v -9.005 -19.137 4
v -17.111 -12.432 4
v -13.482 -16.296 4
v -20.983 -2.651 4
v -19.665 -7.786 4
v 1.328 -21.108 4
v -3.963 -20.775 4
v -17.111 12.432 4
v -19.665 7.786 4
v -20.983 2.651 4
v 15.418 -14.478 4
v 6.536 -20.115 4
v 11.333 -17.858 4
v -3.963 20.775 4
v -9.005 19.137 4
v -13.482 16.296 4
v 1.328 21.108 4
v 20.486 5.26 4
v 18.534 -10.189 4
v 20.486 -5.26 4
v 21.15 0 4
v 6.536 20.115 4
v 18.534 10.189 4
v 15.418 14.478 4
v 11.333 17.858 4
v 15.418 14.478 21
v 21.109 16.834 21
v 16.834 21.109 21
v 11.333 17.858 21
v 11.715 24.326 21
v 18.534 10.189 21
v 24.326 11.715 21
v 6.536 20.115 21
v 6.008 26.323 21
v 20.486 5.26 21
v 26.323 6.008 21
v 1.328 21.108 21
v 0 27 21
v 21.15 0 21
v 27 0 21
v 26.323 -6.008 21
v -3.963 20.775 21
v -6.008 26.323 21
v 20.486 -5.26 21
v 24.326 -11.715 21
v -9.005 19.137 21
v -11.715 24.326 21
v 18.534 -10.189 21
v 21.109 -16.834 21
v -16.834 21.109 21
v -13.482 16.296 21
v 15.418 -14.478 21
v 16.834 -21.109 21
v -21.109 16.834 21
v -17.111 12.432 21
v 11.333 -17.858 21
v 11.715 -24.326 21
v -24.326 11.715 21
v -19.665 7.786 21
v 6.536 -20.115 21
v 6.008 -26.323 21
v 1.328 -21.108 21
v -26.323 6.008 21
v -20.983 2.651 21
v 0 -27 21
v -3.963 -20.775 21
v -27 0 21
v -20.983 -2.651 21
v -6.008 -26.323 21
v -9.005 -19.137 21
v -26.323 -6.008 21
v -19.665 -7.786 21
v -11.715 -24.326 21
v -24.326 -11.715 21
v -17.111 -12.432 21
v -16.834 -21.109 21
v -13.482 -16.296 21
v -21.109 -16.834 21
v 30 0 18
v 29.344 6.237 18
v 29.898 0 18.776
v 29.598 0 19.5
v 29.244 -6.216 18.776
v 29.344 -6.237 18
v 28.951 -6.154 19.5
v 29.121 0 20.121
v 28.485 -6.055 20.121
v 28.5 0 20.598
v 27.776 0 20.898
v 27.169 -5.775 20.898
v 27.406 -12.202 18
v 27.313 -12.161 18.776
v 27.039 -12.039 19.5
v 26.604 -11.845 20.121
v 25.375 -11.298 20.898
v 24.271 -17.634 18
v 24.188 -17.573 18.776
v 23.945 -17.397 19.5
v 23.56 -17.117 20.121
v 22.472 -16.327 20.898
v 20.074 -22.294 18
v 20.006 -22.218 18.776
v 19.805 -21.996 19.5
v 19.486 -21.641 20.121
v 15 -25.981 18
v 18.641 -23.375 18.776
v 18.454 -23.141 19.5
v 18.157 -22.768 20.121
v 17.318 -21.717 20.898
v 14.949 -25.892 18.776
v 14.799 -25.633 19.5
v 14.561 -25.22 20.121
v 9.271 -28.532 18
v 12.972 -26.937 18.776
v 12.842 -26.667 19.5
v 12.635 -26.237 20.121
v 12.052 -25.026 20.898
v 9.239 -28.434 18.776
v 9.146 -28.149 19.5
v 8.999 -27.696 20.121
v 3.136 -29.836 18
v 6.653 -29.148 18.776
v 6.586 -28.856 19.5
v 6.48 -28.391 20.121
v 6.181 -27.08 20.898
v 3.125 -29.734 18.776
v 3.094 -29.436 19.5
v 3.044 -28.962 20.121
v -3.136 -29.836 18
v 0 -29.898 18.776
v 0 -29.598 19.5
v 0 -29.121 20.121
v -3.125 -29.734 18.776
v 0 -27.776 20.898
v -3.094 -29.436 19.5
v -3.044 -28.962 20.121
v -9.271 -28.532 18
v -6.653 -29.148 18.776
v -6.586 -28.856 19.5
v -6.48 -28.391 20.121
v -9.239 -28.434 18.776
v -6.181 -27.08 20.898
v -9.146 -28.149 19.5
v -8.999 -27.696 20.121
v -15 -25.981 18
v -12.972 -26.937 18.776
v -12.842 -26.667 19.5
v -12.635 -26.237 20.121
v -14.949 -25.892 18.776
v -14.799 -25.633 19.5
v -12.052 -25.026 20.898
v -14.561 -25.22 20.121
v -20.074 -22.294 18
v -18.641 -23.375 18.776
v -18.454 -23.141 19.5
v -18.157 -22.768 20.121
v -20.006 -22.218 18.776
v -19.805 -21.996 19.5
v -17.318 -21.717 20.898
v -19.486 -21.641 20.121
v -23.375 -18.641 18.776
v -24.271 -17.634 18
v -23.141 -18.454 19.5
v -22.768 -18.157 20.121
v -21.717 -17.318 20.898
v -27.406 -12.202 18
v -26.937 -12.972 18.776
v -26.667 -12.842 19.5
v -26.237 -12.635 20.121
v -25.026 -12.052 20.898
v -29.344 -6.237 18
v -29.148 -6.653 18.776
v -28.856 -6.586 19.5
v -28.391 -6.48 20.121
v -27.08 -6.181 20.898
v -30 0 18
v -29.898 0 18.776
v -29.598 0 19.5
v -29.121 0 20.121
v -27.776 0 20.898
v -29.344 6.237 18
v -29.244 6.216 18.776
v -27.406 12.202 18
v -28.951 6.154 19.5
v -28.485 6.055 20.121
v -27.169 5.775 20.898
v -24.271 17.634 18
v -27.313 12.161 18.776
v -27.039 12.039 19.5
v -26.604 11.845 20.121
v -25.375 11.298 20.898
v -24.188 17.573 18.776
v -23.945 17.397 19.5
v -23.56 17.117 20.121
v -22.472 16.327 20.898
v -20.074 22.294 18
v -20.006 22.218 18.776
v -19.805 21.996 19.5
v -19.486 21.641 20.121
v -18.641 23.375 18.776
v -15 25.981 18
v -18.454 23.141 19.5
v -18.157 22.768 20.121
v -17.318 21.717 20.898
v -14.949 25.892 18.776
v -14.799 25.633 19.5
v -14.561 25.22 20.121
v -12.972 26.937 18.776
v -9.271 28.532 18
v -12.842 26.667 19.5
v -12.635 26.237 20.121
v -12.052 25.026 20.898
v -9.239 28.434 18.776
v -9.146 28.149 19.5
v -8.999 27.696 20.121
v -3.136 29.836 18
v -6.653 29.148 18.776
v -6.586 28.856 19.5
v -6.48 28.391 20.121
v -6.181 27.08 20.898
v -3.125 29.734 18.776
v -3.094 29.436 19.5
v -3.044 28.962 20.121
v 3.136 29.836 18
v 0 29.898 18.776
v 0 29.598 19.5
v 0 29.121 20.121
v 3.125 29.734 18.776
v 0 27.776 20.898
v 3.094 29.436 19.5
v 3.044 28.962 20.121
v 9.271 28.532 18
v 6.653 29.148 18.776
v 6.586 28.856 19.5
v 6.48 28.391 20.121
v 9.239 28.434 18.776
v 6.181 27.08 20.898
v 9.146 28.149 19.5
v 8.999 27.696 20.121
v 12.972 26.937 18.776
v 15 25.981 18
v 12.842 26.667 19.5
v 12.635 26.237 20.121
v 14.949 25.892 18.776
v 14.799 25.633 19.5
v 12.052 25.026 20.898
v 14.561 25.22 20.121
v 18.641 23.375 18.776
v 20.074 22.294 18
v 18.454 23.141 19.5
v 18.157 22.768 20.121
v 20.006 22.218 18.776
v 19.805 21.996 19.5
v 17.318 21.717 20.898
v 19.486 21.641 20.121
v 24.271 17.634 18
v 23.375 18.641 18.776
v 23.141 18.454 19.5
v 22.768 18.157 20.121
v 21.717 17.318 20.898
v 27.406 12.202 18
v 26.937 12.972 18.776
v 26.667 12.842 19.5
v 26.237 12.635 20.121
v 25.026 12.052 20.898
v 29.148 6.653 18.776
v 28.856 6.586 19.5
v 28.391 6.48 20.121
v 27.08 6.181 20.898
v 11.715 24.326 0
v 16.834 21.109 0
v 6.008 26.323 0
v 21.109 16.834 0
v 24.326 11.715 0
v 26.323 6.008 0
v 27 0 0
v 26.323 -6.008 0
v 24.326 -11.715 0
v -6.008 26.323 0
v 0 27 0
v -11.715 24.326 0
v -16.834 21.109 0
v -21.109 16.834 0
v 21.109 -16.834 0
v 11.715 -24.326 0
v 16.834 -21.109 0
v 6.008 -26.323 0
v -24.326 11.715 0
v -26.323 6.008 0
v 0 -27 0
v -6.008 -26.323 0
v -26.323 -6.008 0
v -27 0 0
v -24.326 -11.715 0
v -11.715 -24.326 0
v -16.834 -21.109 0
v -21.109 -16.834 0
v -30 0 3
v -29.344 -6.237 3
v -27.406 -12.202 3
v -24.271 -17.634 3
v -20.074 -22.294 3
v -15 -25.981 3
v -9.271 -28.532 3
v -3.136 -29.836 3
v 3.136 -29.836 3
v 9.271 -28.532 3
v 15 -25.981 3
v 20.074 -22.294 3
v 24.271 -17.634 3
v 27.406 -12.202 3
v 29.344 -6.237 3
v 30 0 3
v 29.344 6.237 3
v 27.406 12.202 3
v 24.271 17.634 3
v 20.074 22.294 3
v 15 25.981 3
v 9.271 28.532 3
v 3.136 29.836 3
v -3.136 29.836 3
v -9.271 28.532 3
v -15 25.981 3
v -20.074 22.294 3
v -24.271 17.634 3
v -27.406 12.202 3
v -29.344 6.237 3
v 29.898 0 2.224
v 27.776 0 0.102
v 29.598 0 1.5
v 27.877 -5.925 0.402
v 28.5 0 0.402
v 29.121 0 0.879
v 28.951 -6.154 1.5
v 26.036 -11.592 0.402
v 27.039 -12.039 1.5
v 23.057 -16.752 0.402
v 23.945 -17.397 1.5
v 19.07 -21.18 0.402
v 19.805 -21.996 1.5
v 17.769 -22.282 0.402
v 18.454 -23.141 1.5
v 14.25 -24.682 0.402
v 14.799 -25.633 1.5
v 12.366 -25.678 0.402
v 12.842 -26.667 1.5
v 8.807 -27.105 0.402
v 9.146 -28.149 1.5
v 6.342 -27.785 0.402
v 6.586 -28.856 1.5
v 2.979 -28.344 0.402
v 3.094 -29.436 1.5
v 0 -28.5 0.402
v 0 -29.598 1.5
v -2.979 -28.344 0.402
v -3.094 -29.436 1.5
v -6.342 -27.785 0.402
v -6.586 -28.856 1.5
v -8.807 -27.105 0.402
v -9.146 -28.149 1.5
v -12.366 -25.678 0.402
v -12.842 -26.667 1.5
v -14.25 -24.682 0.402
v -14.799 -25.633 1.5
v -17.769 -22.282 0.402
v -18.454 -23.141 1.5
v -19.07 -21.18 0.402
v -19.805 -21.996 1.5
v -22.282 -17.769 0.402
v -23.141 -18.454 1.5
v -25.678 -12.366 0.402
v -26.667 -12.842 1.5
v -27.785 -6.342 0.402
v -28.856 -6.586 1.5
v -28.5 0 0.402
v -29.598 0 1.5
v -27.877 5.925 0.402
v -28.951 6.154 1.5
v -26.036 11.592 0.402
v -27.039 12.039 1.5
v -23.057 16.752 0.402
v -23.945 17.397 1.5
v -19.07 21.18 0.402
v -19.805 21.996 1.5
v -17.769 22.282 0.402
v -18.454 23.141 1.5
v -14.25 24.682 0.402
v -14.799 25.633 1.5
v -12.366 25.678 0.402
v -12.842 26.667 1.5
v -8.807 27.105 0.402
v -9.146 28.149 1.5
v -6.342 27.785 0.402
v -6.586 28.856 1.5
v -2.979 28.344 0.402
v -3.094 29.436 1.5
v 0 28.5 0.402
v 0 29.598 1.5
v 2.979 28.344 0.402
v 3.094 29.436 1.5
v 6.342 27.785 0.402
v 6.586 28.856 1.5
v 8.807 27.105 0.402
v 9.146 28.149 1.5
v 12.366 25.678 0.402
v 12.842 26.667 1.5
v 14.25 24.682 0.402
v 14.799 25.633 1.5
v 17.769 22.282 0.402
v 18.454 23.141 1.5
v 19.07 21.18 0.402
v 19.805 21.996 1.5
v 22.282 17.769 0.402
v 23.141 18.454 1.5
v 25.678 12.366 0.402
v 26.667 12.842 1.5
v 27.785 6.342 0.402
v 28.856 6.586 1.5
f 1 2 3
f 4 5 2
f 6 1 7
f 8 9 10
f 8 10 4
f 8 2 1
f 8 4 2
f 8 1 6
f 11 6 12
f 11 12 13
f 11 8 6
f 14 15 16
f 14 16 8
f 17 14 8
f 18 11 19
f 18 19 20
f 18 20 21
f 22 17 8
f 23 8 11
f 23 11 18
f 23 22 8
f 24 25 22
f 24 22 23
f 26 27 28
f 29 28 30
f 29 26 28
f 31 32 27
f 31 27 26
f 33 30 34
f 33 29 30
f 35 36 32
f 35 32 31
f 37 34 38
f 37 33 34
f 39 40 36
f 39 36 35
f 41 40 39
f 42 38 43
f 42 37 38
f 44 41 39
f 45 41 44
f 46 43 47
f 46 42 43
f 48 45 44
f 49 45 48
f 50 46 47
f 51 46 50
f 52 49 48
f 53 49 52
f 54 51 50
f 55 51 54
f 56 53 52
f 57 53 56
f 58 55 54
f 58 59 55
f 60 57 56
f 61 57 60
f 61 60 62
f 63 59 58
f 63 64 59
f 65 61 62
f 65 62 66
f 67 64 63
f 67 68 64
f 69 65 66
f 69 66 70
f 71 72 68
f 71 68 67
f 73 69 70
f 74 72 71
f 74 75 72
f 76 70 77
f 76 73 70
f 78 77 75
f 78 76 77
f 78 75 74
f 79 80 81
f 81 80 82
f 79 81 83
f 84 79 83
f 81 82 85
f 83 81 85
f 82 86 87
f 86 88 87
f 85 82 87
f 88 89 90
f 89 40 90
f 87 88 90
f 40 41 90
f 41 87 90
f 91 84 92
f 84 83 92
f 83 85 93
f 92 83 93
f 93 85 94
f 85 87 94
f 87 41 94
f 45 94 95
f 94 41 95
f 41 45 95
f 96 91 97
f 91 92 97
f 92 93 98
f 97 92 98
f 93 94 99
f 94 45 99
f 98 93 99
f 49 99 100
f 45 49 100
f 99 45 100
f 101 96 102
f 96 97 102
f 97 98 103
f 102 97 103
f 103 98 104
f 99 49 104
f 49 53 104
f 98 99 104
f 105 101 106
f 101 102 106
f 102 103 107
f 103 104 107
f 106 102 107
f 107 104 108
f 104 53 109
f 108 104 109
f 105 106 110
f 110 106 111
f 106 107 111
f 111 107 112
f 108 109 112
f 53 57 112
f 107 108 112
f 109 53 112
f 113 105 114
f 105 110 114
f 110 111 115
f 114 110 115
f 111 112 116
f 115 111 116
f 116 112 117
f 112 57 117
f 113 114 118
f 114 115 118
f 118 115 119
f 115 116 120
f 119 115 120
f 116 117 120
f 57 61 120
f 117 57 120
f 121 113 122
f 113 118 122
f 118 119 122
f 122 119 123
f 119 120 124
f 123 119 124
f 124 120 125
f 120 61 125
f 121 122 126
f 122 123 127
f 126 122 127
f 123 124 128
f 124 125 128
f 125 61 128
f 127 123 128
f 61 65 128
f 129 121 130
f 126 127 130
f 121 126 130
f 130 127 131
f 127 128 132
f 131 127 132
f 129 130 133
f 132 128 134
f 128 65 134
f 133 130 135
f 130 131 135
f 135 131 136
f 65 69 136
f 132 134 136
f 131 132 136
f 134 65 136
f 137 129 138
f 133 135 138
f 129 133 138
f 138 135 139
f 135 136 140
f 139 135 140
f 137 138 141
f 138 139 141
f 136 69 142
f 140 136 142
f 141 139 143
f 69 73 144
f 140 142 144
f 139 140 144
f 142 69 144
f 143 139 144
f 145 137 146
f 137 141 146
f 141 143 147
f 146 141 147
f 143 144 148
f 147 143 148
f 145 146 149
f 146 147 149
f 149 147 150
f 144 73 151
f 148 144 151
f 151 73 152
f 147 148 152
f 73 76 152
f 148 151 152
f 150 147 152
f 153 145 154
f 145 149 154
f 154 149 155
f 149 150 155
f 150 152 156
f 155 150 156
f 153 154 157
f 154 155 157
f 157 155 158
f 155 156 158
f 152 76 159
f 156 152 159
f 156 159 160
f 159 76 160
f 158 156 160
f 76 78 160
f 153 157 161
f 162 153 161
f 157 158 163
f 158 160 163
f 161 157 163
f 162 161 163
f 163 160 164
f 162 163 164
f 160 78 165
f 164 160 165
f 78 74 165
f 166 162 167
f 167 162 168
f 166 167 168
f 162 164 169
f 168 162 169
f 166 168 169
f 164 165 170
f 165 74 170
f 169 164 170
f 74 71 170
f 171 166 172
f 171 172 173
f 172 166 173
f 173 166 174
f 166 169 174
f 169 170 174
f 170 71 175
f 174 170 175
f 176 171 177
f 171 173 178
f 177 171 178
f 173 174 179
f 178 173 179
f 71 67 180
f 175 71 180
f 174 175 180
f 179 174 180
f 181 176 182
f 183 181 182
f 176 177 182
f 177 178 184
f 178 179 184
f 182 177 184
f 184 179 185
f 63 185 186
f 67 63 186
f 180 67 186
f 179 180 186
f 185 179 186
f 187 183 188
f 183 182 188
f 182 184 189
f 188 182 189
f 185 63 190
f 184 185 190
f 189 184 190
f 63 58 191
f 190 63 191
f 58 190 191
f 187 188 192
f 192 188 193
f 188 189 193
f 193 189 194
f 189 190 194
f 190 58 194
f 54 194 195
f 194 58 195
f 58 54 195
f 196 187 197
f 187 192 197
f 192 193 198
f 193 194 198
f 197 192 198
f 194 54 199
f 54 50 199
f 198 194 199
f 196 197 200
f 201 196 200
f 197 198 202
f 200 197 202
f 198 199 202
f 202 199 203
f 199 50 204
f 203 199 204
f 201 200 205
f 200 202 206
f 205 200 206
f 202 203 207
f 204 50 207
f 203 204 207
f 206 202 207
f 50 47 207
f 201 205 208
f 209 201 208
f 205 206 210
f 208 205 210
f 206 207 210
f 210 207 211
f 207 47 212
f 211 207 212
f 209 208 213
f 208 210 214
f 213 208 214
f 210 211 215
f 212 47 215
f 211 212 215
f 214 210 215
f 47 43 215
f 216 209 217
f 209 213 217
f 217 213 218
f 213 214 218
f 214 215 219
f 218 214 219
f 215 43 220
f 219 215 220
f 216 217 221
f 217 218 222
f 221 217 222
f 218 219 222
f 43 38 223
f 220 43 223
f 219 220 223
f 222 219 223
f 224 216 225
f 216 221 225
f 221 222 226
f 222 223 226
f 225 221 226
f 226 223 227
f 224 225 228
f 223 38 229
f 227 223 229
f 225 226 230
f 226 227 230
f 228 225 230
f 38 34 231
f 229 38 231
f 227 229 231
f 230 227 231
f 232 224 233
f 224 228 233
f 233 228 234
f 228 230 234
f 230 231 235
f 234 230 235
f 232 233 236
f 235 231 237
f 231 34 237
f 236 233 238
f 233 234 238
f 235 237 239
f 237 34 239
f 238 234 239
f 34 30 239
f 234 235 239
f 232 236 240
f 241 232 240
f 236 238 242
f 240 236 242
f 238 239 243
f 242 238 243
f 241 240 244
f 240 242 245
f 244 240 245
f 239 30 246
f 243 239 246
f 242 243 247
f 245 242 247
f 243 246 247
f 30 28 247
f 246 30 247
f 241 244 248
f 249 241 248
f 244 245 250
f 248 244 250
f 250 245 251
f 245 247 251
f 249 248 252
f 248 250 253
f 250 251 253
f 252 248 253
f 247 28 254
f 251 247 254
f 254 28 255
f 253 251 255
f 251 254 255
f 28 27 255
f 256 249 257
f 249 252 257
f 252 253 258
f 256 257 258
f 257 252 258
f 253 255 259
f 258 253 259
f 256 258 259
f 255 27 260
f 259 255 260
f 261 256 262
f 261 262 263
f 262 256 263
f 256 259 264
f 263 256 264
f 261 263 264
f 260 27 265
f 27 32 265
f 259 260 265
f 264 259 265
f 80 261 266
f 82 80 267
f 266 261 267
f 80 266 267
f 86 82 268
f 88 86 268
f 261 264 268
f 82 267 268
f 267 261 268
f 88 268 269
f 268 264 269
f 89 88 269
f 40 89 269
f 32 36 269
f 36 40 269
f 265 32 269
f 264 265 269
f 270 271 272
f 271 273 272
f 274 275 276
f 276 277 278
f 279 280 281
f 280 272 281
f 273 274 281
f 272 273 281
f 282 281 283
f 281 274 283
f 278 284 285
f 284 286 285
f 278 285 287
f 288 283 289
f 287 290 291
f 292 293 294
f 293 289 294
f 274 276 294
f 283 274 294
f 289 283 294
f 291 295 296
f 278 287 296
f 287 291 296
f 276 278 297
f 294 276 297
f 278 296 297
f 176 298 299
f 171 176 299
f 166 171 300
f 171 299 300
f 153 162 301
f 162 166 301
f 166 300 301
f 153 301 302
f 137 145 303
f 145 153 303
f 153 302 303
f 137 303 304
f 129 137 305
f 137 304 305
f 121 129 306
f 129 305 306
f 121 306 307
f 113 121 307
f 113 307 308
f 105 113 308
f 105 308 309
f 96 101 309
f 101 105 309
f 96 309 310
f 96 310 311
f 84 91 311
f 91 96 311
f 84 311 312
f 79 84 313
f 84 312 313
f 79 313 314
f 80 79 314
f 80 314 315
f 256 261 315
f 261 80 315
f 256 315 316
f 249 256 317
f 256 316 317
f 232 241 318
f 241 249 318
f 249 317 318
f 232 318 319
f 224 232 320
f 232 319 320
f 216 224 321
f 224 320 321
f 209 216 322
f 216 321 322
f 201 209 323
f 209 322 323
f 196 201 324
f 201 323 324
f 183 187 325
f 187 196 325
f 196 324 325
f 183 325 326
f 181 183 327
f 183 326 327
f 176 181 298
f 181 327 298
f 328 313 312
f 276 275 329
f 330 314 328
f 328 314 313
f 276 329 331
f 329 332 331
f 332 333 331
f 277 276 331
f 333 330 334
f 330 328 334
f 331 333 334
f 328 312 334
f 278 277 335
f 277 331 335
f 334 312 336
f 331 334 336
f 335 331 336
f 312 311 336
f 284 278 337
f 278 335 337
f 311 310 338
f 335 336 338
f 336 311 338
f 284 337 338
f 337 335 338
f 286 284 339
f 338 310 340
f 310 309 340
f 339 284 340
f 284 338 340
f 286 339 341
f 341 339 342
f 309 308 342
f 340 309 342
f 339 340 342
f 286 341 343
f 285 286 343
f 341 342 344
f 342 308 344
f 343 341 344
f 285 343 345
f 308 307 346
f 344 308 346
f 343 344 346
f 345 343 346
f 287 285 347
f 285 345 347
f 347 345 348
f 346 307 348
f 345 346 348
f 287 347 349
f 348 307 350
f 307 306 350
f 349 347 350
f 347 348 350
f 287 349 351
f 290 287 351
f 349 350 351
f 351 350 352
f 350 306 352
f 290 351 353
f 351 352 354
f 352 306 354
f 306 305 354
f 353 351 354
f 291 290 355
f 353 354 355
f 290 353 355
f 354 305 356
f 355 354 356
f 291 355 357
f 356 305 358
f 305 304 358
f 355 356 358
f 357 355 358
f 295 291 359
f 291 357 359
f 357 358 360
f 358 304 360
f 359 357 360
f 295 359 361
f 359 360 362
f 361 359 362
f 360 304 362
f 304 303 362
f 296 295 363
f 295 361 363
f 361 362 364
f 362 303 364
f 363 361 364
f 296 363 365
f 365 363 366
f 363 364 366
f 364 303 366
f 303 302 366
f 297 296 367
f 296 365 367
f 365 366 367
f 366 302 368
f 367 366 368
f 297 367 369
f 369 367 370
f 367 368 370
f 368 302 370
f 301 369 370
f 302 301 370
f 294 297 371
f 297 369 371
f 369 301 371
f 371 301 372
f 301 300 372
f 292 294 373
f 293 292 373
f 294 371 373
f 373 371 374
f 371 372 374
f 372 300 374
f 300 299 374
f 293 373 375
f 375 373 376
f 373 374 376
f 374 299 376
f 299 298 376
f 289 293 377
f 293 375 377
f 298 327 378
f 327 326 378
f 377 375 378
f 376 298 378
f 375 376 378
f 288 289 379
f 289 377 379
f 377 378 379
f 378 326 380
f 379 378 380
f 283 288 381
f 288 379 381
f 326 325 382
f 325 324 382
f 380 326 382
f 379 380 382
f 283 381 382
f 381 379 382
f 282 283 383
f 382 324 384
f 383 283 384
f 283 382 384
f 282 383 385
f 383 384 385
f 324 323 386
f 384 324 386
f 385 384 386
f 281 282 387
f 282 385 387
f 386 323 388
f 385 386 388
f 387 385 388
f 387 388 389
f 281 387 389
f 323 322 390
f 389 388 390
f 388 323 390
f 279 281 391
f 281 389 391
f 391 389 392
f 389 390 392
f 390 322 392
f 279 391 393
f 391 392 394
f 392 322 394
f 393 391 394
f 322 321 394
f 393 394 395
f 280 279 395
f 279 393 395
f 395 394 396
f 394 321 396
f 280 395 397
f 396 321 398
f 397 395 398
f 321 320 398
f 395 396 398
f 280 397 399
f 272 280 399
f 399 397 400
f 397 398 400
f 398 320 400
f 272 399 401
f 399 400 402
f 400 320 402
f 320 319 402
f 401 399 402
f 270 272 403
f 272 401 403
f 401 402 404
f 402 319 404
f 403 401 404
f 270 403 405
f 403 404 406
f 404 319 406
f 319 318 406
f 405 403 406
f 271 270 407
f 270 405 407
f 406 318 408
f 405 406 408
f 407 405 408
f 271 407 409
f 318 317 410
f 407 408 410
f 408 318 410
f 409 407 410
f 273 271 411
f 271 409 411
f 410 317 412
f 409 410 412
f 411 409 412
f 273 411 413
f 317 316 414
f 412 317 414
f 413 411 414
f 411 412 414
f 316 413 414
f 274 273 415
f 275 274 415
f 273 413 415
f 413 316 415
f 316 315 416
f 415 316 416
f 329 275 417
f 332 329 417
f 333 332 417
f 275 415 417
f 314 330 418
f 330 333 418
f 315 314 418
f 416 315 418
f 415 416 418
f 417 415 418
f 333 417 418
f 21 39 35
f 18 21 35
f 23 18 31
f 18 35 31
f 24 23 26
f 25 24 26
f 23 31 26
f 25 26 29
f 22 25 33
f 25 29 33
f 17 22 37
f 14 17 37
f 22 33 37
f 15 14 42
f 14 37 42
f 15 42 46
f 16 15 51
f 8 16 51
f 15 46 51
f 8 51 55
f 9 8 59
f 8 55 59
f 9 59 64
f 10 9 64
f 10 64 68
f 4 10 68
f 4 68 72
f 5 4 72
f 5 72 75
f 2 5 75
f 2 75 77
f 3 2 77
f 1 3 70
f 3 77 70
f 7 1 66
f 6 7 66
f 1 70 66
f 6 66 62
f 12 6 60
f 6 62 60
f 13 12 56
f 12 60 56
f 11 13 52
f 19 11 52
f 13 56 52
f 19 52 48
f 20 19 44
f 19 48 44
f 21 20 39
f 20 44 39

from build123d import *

# Parameters (mm, degrees)
SKETCH_1_R          = 30
EXTRUDE_1_DEPTH     = 21
SKETCH_2_R          = 21.15
CUT_EXTRUDE_1_DEPTH = 17


with BuildPart() as part:
    # 草图1 → 凸台-拉伸1 (new body)
    with BuildSketch(Plane.XY):
        with Locations(Location((0, 0, 0), (0, 0, 180))):
            Circle(SKETCH_1_R)
    extrude(amount=EXTRUDE_1_DEPTH)

    # 草图2 → 切除-拉伸1 (cut)
    with BuildSketch(Plane.XY.offset(21)):
        Circle(SKETCH_2_R)
    extrude(amount=-CUT_EXTRUDE_1_DEPTH, mode=Mode.SUBTRACT)

    # 草图4 → 切除-旋转1 (revolve, cut)
    with BuildSketch(Plane(origin=(0, 0, 0), x_dir=(1, 0, 0), z_dir=(0, 1, 0)), mode=Mode.PRIVATE) as cut_revolve_1_sk:
        with BuildLine():
            ThreePointArc((-27, 0), (-29.121320344, -0.878679656), (-30, -3))
            Line((-30, -3), (-30, 0))
            Line((-30, 0), (-27, 0))
        make_face()
        with BuildLine():
            ThreePointArc((-30, -18), (-29.121320344, -20.121320344), (-27, -21))
            Line((-27, -21), (-30, -21))
            Line((-30, -21), (-30, -18))
        make_face()
    revolve(cut_revolve_1_sk.sketch.rotate(Axis((0, 0, 0), (0, 0, -1)), 180), axis=Axis((0, 0, 0), (0, 0, -1)), mode=Mode.SUBTRACT)


solid = part.part
